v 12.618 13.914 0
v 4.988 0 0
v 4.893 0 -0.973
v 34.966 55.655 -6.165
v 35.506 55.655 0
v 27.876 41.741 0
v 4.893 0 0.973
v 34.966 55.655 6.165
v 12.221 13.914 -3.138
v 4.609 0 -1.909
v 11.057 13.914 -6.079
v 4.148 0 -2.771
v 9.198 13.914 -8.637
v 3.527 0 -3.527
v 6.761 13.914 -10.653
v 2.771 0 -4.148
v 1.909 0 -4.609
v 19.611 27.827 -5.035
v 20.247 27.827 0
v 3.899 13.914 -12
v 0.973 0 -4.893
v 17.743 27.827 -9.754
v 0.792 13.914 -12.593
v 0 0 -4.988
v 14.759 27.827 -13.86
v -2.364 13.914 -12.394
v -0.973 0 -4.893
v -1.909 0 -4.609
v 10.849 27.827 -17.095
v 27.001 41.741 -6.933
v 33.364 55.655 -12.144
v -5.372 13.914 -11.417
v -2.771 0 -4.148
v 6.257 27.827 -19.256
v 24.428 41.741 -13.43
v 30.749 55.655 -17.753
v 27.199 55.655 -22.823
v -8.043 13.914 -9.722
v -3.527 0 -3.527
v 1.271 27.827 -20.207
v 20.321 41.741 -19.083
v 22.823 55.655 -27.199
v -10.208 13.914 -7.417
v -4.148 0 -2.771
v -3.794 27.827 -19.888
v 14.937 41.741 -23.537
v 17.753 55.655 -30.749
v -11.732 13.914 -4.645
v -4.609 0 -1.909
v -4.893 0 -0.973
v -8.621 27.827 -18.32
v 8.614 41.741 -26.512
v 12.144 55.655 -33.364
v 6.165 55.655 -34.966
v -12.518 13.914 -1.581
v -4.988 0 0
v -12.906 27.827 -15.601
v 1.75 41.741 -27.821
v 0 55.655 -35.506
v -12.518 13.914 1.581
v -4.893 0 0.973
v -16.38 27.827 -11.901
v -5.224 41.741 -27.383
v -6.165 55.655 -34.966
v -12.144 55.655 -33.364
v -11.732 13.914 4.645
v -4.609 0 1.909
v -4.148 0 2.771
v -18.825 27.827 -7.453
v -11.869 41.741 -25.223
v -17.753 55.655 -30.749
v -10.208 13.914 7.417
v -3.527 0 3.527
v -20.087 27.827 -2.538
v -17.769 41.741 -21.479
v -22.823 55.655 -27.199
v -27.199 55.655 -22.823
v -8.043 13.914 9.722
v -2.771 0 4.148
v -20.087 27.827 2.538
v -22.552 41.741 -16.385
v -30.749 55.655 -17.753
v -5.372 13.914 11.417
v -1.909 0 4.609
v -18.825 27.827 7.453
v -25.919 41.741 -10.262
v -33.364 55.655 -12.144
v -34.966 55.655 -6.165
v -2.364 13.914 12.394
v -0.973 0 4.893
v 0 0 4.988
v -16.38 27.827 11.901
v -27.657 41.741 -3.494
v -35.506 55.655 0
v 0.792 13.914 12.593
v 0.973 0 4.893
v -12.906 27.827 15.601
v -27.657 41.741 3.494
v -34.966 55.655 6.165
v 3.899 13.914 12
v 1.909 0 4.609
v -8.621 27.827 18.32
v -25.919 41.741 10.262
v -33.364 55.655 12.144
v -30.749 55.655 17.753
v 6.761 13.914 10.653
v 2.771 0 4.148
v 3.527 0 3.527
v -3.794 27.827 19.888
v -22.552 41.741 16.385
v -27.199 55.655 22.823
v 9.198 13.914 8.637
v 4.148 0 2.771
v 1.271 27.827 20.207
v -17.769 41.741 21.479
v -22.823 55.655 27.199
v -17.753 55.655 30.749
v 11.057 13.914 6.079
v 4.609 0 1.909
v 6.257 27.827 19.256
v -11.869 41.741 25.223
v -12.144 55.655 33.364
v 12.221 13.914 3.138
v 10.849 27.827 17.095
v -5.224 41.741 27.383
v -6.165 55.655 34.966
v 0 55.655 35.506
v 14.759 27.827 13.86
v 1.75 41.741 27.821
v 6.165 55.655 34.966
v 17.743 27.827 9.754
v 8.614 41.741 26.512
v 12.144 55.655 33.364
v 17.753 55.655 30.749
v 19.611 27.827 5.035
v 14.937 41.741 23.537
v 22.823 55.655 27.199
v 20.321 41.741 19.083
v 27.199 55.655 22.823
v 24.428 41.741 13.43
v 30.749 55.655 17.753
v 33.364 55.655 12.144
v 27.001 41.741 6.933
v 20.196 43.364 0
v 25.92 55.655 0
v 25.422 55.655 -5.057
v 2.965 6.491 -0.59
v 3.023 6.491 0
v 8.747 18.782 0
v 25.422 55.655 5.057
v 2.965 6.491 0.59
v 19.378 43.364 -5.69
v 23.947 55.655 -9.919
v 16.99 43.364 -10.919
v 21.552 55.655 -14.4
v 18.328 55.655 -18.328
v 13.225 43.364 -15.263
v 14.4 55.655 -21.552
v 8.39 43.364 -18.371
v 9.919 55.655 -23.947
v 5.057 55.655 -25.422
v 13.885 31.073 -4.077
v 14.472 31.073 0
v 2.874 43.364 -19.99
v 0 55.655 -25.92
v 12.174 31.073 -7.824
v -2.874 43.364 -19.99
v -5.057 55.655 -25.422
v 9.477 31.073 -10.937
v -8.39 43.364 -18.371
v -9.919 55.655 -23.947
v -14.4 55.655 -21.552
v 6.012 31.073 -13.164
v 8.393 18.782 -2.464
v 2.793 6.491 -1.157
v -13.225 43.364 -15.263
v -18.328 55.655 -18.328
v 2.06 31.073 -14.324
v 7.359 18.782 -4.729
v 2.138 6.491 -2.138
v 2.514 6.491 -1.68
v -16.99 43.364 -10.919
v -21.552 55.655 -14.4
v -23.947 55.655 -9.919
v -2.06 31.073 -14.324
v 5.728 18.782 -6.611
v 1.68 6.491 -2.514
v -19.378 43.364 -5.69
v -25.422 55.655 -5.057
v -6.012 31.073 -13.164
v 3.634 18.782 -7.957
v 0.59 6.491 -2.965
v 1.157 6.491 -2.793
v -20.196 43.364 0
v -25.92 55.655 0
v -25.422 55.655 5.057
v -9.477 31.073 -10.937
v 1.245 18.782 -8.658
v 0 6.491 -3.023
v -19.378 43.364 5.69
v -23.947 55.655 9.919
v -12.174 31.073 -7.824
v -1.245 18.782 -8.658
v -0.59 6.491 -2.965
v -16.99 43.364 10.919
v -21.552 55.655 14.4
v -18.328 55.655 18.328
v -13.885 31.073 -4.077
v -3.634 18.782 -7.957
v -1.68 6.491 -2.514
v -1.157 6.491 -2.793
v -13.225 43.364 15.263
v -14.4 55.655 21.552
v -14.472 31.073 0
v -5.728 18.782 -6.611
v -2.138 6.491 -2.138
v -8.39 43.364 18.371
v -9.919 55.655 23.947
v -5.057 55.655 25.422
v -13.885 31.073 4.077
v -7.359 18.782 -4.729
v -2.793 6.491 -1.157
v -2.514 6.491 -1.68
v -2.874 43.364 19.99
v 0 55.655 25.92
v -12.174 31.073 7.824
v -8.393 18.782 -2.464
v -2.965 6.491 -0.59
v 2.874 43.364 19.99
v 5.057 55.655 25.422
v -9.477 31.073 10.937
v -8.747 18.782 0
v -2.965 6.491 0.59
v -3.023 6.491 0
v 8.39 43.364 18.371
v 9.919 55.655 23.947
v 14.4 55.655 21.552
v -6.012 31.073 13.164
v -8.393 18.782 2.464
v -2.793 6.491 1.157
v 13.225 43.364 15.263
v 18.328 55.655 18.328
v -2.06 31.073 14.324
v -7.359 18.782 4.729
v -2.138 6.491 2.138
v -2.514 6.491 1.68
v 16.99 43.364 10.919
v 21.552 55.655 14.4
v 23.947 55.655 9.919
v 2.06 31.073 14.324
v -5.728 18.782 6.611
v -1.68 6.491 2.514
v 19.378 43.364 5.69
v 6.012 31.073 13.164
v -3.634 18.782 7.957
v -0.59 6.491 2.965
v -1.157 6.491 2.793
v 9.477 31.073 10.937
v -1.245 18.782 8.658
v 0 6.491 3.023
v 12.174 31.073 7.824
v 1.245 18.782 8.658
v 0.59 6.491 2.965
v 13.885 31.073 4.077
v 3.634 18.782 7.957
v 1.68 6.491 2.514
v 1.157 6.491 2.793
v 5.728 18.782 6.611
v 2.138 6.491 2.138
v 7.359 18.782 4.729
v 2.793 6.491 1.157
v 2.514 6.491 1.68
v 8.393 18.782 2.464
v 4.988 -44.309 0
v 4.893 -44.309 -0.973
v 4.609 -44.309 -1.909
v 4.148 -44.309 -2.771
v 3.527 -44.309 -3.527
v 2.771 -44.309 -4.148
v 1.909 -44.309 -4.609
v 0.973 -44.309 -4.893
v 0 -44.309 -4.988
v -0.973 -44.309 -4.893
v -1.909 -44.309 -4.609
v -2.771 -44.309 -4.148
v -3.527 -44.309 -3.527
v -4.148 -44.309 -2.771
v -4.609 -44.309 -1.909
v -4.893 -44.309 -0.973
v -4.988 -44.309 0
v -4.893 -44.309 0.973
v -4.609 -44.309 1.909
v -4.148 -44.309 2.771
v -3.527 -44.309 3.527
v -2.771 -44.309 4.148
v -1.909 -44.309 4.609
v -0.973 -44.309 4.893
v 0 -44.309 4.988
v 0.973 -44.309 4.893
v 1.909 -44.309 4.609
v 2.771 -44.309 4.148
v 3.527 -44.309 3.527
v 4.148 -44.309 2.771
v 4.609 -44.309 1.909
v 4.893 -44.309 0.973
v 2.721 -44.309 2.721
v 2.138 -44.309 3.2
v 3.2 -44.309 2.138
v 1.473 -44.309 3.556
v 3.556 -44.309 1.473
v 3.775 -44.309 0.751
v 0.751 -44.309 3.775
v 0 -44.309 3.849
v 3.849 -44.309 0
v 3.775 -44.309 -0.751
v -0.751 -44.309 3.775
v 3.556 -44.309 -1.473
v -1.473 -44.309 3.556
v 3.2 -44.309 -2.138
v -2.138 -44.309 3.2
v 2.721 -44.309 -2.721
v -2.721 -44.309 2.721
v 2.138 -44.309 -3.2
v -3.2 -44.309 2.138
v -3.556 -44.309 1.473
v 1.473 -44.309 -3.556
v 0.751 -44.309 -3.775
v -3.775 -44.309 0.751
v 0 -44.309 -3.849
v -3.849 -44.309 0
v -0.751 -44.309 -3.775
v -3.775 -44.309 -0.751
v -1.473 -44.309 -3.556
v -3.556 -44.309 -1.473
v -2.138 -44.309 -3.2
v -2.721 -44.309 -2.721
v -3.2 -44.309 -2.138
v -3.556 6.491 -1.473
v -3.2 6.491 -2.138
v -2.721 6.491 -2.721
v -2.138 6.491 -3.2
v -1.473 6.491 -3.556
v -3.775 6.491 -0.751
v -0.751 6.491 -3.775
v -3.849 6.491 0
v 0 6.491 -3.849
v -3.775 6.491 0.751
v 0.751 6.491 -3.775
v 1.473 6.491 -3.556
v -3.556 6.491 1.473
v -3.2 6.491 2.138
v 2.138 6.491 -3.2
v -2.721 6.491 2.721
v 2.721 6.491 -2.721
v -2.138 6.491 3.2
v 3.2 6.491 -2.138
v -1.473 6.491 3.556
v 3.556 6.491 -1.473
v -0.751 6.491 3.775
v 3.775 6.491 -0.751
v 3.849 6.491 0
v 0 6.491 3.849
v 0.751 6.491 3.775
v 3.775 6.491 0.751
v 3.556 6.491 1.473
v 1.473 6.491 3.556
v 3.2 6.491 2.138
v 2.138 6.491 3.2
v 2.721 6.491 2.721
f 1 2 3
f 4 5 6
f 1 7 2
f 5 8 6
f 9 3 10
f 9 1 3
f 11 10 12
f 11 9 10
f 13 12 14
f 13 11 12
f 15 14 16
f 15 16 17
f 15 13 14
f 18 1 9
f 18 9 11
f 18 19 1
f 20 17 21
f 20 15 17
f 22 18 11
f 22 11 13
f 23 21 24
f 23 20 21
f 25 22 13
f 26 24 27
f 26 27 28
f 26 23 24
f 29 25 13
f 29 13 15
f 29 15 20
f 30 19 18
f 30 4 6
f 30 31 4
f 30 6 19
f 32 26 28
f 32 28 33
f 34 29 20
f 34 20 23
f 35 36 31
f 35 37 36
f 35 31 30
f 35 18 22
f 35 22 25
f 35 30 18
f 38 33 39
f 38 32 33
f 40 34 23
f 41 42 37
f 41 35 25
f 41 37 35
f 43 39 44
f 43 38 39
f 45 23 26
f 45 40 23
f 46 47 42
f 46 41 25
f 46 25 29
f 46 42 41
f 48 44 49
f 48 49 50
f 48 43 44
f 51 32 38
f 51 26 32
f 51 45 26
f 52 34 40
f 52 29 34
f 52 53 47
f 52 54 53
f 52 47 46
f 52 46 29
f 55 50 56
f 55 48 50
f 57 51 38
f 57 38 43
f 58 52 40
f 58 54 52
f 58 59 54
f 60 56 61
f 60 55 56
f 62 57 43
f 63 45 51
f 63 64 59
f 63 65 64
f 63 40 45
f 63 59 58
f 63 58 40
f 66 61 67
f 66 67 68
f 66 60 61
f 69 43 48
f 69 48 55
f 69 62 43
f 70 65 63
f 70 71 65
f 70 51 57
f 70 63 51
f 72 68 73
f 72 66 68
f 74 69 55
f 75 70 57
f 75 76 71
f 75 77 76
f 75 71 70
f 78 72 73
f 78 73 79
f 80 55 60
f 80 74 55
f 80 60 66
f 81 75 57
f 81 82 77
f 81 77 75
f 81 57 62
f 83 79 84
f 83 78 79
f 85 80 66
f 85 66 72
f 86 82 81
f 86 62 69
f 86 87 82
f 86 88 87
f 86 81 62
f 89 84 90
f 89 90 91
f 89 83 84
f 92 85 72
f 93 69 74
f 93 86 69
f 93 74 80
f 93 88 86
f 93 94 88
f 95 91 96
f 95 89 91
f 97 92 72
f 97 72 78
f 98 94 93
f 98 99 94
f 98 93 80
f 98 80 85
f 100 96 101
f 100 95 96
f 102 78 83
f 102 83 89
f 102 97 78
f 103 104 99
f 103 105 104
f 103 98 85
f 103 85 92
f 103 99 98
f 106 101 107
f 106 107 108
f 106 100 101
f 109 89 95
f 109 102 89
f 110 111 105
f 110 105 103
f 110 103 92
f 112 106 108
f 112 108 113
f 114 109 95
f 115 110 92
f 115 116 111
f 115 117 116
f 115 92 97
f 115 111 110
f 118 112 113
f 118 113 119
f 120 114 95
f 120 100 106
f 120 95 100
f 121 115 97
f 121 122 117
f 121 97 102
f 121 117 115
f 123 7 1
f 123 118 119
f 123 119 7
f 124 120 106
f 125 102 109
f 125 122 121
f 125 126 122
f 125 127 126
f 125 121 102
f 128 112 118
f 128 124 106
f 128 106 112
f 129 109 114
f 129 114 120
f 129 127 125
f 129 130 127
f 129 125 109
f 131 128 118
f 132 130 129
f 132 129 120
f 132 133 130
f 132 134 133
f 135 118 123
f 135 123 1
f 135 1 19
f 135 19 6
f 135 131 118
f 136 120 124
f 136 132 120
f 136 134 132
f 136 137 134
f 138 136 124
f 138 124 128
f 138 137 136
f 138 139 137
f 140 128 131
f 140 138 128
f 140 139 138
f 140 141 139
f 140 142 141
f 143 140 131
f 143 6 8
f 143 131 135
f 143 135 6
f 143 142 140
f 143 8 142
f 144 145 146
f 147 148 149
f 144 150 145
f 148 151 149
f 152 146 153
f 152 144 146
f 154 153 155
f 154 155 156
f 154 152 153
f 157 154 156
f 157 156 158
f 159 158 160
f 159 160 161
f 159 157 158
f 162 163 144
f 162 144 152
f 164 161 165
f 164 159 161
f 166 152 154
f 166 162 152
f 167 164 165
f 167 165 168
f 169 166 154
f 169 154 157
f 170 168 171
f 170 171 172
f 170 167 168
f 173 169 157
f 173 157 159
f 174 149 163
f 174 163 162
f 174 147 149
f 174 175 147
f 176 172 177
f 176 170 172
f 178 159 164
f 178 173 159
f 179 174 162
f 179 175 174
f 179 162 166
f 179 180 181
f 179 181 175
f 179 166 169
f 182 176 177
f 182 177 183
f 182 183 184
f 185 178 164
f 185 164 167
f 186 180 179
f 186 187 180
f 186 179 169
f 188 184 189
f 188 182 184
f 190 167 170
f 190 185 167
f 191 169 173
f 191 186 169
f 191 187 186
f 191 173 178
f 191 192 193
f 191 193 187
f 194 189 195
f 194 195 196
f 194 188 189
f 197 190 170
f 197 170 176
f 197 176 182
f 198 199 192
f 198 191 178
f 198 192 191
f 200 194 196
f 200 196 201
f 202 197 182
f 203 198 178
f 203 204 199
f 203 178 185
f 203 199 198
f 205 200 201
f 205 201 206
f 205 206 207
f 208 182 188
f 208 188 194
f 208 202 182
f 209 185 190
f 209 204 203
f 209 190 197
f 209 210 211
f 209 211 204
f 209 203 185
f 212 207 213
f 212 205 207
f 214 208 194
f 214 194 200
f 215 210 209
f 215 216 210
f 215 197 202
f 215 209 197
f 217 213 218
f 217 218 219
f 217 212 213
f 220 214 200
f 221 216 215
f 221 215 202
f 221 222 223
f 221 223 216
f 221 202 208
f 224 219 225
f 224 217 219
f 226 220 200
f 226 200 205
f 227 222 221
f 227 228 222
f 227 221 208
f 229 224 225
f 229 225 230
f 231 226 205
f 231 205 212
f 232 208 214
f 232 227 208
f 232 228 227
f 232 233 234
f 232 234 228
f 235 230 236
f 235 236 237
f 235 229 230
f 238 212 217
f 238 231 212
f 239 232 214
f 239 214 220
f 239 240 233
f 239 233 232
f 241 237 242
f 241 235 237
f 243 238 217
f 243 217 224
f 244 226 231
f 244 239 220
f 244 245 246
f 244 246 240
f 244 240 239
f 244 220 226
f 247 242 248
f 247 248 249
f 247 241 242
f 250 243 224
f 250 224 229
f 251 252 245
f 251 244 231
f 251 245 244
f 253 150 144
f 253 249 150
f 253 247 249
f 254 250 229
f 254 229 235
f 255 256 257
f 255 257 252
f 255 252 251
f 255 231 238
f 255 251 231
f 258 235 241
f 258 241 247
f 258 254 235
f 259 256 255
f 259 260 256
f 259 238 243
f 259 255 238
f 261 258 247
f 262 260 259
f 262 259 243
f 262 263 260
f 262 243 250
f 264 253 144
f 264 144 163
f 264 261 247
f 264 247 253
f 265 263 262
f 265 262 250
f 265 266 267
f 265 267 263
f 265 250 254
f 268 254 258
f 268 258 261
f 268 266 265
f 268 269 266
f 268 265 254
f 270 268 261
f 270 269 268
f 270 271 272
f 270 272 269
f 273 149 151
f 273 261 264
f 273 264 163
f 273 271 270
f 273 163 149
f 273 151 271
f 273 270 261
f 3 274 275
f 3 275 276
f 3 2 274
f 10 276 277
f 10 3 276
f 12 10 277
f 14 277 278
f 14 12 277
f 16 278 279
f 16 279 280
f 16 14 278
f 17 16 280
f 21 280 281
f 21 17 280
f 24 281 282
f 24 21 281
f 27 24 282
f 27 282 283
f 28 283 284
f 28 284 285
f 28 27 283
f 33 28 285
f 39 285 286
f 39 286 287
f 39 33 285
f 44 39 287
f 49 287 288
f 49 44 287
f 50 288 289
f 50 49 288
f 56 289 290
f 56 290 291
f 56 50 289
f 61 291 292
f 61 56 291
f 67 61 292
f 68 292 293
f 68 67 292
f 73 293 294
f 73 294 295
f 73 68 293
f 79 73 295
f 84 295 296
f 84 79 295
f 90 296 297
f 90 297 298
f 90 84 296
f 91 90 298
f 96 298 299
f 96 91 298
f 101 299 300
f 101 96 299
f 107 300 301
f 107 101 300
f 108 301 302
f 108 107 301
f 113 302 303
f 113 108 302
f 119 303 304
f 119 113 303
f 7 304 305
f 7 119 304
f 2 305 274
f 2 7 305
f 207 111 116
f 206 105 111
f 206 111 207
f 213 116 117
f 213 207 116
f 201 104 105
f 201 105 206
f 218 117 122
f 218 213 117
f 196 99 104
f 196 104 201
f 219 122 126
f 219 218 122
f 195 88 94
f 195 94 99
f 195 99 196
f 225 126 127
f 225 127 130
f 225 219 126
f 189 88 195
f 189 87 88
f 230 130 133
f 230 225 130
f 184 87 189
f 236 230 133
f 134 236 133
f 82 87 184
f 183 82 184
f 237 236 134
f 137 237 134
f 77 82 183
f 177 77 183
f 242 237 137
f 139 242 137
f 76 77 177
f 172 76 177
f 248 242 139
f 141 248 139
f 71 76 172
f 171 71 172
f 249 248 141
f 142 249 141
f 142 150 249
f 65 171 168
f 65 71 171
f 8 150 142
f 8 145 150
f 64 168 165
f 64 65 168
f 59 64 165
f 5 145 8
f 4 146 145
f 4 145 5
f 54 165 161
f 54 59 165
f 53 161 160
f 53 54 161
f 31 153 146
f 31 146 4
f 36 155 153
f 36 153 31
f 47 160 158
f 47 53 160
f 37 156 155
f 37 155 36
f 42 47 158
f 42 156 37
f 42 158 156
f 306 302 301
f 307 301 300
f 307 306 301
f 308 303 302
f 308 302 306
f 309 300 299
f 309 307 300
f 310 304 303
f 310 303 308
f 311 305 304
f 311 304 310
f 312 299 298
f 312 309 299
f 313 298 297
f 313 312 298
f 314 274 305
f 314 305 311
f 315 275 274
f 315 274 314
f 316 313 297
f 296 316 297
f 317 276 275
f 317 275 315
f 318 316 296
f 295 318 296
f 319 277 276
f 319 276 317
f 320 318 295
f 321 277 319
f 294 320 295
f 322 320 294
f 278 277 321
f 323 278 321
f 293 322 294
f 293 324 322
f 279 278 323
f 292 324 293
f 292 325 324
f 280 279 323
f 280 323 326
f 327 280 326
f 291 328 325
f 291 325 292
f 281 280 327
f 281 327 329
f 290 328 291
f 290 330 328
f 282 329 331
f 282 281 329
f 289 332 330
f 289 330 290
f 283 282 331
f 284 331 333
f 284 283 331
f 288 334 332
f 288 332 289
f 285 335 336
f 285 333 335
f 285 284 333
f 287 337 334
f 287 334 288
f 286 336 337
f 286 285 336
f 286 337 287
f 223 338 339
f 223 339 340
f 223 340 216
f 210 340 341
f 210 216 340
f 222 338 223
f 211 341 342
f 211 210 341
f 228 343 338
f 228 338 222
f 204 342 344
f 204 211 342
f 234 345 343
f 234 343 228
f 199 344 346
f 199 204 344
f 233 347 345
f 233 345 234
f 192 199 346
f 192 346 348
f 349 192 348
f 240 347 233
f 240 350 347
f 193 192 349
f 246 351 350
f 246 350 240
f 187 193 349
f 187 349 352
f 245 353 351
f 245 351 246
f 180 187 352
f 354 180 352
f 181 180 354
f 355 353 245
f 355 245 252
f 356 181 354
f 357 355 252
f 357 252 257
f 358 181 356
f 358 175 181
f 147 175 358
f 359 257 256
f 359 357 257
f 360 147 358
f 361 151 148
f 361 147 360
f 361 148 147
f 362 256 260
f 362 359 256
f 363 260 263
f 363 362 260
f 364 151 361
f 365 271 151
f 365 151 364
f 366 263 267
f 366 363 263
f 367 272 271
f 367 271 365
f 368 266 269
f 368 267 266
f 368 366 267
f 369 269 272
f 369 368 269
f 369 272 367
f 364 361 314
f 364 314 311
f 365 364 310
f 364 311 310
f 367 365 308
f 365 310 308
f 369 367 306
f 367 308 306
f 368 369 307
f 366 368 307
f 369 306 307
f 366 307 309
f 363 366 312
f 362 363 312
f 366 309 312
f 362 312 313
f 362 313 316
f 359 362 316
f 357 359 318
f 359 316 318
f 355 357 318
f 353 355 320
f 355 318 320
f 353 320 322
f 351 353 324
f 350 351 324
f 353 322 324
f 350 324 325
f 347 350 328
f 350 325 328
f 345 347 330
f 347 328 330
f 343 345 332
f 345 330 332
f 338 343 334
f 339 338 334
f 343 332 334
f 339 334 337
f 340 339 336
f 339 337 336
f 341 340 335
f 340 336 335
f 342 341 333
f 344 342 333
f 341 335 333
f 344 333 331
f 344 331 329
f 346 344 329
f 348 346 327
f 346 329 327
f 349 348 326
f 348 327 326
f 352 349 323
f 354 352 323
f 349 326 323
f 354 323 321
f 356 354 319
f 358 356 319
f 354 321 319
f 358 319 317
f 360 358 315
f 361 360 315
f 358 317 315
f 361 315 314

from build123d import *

# Parameters (mm, degrees)
F2_R     = 3.8487
F3_DEPTH = 50.8


with BuildPart() as f1:
    # F0 (on Top) → F1 (revolve)
    with BuildSketch(Plane.XY):
        Polygon((35.50566, 55.65488), (25.920112, 55.65488), (0, 0), (0, -44.308718), (4.988399, -44.308718), (4.988399, 0), align=None)
    revolve(axis=Axis((0, -22.154359, 0), (0, 1, 0)))

    # F2 (on face) → F3 (cut)
    with BuildSketch(Plane.XZ.offset(44.308718)):
        Circle(F2_R)
    extrude(amount=-F3_DEPTH, mode=Mode.SUBTRACT)


solid = f1.part
